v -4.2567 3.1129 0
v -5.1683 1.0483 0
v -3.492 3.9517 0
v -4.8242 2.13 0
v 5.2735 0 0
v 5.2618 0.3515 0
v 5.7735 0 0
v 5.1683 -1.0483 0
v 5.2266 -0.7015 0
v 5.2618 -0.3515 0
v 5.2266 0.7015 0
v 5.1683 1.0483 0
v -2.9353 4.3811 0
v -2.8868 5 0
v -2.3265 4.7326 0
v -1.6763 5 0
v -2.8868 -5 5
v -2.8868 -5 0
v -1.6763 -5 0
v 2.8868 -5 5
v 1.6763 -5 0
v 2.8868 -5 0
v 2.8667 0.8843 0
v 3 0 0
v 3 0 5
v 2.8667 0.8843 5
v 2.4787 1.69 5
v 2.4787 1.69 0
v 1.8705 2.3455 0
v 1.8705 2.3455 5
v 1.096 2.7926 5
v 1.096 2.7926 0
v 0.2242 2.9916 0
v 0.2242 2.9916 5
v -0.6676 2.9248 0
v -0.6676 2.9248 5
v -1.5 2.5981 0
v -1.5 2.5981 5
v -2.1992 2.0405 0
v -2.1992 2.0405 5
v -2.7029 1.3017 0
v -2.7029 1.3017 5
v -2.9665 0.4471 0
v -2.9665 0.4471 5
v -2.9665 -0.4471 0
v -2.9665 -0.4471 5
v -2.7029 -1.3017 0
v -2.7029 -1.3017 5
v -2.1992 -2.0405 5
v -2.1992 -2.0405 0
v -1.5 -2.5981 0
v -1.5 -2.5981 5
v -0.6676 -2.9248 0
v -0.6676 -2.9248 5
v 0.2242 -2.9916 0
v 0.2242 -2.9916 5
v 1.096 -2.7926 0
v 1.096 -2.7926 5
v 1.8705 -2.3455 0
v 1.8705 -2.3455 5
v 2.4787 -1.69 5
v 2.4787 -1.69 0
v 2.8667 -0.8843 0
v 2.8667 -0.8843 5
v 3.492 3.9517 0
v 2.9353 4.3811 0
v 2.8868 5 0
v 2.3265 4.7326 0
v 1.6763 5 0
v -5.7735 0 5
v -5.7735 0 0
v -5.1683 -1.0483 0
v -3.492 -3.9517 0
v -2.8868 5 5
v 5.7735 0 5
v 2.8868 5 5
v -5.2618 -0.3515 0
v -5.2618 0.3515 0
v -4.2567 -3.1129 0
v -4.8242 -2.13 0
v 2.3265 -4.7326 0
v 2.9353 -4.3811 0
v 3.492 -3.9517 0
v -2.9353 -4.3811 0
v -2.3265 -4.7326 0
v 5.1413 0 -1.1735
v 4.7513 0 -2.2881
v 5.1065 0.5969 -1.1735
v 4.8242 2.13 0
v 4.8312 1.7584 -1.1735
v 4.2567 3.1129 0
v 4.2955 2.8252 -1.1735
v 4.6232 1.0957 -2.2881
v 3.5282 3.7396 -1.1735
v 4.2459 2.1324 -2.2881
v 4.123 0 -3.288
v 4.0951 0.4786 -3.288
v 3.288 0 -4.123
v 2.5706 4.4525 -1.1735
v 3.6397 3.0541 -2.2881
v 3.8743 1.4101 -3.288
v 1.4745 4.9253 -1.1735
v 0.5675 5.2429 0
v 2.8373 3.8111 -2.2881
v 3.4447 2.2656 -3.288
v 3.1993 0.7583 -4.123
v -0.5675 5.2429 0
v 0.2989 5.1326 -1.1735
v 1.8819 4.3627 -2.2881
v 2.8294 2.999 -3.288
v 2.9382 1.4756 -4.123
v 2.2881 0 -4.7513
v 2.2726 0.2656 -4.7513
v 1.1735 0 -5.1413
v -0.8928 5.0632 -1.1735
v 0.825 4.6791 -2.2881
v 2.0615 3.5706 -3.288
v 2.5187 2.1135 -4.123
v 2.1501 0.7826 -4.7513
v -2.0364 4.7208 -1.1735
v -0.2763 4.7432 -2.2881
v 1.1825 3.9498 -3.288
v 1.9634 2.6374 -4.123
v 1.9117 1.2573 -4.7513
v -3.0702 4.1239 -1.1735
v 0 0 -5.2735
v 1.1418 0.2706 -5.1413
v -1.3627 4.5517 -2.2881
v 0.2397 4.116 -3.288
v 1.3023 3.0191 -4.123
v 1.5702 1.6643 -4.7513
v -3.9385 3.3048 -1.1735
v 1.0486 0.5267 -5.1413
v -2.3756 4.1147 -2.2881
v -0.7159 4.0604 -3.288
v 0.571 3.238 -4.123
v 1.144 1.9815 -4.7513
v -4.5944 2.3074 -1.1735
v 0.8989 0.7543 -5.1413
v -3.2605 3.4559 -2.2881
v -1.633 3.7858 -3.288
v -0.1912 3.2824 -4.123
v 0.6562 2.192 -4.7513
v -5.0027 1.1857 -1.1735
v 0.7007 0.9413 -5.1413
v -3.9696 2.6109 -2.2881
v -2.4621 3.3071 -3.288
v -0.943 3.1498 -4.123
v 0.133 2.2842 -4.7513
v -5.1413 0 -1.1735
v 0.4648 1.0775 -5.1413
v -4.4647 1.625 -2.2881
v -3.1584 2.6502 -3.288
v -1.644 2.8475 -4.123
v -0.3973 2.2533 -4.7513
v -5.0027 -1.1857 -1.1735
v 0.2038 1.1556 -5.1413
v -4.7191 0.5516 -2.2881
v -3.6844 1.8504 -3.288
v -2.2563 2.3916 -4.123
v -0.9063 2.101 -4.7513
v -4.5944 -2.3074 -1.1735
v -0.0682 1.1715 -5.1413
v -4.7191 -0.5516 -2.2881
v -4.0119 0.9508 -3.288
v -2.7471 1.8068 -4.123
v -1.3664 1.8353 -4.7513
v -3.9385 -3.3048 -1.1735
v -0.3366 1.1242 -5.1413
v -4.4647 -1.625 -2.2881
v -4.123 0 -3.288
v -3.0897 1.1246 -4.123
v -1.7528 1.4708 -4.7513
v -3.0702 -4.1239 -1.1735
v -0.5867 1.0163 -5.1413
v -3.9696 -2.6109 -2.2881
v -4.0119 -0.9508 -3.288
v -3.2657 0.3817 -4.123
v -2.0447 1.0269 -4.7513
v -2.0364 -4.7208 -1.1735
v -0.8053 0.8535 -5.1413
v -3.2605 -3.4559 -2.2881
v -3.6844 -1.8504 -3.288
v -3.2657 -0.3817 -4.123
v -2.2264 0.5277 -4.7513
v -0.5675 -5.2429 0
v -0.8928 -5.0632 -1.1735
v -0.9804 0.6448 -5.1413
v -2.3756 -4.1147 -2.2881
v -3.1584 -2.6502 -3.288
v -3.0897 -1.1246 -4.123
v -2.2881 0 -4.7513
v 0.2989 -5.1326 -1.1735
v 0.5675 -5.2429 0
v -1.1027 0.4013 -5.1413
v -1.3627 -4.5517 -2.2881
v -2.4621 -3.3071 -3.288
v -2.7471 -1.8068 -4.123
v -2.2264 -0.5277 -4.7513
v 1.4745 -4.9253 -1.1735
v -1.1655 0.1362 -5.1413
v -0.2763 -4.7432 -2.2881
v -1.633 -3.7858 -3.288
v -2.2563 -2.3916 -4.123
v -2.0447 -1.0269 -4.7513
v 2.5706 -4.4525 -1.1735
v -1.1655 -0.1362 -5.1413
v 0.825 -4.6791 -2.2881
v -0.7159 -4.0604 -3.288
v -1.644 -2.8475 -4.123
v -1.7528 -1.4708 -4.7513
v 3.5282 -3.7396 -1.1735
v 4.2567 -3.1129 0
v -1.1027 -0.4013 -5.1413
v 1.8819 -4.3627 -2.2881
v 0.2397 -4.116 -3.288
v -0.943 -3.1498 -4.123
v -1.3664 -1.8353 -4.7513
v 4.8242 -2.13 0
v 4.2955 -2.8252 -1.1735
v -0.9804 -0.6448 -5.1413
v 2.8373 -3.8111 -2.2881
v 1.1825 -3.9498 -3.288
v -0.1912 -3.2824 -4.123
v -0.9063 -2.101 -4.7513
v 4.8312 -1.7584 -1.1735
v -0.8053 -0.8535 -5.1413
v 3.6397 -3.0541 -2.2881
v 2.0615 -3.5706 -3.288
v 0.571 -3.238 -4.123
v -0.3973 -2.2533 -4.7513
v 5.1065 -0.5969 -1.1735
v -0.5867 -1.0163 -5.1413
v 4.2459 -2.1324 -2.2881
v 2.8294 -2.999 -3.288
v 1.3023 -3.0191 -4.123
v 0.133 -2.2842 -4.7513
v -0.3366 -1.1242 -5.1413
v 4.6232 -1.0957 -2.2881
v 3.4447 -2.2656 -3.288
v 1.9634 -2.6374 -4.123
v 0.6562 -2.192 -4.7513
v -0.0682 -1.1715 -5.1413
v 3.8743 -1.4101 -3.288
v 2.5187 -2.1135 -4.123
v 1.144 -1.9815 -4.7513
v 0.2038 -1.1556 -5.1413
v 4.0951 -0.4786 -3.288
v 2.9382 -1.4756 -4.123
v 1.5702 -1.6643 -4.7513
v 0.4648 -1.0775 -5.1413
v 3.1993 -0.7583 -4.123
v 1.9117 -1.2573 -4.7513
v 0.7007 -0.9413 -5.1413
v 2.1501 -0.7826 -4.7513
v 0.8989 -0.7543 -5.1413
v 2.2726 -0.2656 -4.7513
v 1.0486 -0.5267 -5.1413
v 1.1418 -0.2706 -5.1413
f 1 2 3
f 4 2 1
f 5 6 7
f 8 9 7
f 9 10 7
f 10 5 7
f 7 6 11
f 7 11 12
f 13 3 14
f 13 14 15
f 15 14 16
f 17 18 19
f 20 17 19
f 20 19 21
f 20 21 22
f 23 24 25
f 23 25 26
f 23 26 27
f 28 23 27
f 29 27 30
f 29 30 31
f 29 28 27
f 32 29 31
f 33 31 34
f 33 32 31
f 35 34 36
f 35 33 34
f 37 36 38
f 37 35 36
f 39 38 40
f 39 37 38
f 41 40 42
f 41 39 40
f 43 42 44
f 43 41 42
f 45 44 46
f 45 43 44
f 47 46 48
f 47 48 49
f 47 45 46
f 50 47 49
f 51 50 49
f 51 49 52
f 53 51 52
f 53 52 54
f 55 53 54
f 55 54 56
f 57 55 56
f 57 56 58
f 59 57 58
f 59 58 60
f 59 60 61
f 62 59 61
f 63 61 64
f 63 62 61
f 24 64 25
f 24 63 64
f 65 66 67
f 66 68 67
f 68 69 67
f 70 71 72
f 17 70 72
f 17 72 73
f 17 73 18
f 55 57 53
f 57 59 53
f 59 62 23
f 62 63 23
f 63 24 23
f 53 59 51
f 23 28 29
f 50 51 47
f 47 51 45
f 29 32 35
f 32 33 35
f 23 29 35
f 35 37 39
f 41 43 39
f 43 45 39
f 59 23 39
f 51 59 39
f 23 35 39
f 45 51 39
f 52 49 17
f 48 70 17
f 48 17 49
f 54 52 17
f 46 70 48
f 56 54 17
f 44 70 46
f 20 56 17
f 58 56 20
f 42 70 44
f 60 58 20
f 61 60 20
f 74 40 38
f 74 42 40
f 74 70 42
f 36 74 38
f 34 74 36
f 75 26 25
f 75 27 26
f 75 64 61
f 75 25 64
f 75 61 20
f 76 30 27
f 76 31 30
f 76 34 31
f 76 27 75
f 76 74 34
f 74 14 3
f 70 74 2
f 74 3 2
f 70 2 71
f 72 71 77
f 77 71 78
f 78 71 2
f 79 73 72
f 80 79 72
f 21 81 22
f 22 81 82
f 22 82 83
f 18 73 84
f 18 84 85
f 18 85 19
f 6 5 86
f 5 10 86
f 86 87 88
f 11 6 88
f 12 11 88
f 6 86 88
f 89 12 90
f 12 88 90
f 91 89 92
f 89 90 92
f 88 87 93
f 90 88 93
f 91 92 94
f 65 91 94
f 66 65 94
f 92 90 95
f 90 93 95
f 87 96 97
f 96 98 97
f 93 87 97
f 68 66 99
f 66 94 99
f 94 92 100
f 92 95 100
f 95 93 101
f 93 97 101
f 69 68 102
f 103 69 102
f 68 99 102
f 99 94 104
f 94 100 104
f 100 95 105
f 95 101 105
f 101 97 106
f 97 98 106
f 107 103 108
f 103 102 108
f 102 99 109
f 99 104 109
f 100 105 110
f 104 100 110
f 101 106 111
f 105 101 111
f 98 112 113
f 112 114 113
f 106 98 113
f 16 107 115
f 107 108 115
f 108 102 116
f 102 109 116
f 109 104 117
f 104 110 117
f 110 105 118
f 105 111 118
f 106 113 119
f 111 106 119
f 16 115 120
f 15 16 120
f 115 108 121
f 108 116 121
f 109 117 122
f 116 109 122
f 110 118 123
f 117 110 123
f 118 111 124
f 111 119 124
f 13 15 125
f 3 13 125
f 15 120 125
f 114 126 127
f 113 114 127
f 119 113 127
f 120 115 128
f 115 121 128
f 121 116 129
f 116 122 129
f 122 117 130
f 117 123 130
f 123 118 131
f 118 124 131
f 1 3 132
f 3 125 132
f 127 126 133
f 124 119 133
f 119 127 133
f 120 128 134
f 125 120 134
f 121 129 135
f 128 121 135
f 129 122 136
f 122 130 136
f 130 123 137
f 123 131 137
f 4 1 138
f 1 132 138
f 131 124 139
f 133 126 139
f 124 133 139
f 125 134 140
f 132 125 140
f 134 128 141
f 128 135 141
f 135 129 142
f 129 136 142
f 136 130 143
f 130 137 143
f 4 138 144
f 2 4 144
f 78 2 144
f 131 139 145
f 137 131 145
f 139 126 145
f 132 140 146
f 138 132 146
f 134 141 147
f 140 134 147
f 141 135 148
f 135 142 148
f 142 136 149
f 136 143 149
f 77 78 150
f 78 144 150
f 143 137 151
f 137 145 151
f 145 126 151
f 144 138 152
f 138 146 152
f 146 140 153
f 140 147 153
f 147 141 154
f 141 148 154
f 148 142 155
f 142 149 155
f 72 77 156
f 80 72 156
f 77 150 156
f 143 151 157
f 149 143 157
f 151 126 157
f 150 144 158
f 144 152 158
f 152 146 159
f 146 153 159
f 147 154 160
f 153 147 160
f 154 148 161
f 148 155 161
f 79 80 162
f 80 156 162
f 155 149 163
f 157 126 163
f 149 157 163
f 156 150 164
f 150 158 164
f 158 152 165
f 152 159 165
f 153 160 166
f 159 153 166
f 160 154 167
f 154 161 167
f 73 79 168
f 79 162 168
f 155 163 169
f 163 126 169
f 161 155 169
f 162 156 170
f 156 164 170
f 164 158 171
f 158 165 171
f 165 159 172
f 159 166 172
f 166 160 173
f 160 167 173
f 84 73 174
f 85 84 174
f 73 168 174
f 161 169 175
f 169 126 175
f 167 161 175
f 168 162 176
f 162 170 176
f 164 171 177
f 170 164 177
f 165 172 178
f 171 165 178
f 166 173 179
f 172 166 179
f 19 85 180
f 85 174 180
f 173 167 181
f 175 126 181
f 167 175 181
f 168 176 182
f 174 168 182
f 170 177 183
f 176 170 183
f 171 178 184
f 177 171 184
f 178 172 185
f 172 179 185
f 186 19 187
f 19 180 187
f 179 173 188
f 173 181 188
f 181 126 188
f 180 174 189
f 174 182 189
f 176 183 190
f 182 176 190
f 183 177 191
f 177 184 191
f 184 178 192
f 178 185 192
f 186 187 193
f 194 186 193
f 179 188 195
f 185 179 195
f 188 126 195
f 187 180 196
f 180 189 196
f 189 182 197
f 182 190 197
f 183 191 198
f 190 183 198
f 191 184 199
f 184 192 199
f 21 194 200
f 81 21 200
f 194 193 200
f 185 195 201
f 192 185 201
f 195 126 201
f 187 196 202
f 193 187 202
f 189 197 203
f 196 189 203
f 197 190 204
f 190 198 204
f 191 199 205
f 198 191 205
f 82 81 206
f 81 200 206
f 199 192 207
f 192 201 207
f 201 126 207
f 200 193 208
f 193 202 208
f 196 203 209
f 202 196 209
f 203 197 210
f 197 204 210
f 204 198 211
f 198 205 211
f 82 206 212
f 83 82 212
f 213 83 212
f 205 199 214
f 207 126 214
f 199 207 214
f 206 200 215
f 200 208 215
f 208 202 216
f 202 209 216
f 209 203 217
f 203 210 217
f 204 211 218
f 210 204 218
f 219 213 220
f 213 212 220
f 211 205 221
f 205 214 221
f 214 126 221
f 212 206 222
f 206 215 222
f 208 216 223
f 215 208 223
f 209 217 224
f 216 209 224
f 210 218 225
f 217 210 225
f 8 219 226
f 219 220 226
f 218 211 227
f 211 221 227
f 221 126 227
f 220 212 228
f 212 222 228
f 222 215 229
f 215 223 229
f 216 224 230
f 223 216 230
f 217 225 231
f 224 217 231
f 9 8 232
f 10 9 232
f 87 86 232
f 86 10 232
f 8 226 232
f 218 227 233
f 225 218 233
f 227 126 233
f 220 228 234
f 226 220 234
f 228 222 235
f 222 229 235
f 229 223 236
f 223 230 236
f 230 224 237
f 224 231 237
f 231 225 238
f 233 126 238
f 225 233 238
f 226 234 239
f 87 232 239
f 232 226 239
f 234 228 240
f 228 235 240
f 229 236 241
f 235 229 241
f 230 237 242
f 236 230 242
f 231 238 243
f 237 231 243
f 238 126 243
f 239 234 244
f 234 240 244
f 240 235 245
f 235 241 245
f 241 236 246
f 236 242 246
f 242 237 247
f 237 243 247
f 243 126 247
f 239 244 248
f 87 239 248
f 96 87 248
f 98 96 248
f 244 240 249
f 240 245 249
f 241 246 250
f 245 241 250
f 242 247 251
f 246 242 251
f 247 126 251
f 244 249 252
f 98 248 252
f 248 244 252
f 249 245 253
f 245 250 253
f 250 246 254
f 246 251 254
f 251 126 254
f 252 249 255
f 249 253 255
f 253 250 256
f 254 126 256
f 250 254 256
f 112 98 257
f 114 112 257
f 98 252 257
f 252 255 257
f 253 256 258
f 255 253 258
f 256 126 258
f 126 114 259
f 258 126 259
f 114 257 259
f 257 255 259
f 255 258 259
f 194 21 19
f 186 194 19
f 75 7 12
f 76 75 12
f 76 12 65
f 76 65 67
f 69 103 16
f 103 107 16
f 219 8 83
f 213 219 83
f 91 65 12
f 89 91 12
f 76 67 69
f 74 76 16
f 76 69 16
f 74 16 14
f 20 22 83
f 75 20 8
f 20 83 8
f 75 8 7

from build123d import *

# Parameters (mm, degrees)
ESBO_O1_R                = 3
RESSALTO_EXTRUS_O1_DEPTH = 5


with BuildPart() as part:
    # Esboço1 → Ressalto-extrusão1 (new body)
    with BuildSketch(Plane.XY):
        Polygon((2.886751346, 5), (-2.886751346, 5), (-5.773502692, 0), (-2.886751346, -5), (2.886751346, -5), (5.773502692, 0), align=None)
        Circle(ESBO_O1_R, mode=Mode.SUBTRACT)
    extrude(amount=RESSALTO_EXTRUS_O1_DEPTH)

    # Esboço2 → Revolução1 (revolve)
    with BuildSketch(Plane(origin=(0, 0, 0), x_dir=(1, 0, 0), z_dir=(0, 1, 0))):
        with BuildLine():
            Line((0, 0), (5.273502692, 0))
            ThreePointArc((5.273502692, 0), (3.728929514, 3.728929514), (0, 5.273502692))
            Line((0, 5.273502692), (0, 0))
        make_face()
    revolve(axis=Axis((0, 0, -5.273502692), (0, 0, 1)))


solid = part.part
